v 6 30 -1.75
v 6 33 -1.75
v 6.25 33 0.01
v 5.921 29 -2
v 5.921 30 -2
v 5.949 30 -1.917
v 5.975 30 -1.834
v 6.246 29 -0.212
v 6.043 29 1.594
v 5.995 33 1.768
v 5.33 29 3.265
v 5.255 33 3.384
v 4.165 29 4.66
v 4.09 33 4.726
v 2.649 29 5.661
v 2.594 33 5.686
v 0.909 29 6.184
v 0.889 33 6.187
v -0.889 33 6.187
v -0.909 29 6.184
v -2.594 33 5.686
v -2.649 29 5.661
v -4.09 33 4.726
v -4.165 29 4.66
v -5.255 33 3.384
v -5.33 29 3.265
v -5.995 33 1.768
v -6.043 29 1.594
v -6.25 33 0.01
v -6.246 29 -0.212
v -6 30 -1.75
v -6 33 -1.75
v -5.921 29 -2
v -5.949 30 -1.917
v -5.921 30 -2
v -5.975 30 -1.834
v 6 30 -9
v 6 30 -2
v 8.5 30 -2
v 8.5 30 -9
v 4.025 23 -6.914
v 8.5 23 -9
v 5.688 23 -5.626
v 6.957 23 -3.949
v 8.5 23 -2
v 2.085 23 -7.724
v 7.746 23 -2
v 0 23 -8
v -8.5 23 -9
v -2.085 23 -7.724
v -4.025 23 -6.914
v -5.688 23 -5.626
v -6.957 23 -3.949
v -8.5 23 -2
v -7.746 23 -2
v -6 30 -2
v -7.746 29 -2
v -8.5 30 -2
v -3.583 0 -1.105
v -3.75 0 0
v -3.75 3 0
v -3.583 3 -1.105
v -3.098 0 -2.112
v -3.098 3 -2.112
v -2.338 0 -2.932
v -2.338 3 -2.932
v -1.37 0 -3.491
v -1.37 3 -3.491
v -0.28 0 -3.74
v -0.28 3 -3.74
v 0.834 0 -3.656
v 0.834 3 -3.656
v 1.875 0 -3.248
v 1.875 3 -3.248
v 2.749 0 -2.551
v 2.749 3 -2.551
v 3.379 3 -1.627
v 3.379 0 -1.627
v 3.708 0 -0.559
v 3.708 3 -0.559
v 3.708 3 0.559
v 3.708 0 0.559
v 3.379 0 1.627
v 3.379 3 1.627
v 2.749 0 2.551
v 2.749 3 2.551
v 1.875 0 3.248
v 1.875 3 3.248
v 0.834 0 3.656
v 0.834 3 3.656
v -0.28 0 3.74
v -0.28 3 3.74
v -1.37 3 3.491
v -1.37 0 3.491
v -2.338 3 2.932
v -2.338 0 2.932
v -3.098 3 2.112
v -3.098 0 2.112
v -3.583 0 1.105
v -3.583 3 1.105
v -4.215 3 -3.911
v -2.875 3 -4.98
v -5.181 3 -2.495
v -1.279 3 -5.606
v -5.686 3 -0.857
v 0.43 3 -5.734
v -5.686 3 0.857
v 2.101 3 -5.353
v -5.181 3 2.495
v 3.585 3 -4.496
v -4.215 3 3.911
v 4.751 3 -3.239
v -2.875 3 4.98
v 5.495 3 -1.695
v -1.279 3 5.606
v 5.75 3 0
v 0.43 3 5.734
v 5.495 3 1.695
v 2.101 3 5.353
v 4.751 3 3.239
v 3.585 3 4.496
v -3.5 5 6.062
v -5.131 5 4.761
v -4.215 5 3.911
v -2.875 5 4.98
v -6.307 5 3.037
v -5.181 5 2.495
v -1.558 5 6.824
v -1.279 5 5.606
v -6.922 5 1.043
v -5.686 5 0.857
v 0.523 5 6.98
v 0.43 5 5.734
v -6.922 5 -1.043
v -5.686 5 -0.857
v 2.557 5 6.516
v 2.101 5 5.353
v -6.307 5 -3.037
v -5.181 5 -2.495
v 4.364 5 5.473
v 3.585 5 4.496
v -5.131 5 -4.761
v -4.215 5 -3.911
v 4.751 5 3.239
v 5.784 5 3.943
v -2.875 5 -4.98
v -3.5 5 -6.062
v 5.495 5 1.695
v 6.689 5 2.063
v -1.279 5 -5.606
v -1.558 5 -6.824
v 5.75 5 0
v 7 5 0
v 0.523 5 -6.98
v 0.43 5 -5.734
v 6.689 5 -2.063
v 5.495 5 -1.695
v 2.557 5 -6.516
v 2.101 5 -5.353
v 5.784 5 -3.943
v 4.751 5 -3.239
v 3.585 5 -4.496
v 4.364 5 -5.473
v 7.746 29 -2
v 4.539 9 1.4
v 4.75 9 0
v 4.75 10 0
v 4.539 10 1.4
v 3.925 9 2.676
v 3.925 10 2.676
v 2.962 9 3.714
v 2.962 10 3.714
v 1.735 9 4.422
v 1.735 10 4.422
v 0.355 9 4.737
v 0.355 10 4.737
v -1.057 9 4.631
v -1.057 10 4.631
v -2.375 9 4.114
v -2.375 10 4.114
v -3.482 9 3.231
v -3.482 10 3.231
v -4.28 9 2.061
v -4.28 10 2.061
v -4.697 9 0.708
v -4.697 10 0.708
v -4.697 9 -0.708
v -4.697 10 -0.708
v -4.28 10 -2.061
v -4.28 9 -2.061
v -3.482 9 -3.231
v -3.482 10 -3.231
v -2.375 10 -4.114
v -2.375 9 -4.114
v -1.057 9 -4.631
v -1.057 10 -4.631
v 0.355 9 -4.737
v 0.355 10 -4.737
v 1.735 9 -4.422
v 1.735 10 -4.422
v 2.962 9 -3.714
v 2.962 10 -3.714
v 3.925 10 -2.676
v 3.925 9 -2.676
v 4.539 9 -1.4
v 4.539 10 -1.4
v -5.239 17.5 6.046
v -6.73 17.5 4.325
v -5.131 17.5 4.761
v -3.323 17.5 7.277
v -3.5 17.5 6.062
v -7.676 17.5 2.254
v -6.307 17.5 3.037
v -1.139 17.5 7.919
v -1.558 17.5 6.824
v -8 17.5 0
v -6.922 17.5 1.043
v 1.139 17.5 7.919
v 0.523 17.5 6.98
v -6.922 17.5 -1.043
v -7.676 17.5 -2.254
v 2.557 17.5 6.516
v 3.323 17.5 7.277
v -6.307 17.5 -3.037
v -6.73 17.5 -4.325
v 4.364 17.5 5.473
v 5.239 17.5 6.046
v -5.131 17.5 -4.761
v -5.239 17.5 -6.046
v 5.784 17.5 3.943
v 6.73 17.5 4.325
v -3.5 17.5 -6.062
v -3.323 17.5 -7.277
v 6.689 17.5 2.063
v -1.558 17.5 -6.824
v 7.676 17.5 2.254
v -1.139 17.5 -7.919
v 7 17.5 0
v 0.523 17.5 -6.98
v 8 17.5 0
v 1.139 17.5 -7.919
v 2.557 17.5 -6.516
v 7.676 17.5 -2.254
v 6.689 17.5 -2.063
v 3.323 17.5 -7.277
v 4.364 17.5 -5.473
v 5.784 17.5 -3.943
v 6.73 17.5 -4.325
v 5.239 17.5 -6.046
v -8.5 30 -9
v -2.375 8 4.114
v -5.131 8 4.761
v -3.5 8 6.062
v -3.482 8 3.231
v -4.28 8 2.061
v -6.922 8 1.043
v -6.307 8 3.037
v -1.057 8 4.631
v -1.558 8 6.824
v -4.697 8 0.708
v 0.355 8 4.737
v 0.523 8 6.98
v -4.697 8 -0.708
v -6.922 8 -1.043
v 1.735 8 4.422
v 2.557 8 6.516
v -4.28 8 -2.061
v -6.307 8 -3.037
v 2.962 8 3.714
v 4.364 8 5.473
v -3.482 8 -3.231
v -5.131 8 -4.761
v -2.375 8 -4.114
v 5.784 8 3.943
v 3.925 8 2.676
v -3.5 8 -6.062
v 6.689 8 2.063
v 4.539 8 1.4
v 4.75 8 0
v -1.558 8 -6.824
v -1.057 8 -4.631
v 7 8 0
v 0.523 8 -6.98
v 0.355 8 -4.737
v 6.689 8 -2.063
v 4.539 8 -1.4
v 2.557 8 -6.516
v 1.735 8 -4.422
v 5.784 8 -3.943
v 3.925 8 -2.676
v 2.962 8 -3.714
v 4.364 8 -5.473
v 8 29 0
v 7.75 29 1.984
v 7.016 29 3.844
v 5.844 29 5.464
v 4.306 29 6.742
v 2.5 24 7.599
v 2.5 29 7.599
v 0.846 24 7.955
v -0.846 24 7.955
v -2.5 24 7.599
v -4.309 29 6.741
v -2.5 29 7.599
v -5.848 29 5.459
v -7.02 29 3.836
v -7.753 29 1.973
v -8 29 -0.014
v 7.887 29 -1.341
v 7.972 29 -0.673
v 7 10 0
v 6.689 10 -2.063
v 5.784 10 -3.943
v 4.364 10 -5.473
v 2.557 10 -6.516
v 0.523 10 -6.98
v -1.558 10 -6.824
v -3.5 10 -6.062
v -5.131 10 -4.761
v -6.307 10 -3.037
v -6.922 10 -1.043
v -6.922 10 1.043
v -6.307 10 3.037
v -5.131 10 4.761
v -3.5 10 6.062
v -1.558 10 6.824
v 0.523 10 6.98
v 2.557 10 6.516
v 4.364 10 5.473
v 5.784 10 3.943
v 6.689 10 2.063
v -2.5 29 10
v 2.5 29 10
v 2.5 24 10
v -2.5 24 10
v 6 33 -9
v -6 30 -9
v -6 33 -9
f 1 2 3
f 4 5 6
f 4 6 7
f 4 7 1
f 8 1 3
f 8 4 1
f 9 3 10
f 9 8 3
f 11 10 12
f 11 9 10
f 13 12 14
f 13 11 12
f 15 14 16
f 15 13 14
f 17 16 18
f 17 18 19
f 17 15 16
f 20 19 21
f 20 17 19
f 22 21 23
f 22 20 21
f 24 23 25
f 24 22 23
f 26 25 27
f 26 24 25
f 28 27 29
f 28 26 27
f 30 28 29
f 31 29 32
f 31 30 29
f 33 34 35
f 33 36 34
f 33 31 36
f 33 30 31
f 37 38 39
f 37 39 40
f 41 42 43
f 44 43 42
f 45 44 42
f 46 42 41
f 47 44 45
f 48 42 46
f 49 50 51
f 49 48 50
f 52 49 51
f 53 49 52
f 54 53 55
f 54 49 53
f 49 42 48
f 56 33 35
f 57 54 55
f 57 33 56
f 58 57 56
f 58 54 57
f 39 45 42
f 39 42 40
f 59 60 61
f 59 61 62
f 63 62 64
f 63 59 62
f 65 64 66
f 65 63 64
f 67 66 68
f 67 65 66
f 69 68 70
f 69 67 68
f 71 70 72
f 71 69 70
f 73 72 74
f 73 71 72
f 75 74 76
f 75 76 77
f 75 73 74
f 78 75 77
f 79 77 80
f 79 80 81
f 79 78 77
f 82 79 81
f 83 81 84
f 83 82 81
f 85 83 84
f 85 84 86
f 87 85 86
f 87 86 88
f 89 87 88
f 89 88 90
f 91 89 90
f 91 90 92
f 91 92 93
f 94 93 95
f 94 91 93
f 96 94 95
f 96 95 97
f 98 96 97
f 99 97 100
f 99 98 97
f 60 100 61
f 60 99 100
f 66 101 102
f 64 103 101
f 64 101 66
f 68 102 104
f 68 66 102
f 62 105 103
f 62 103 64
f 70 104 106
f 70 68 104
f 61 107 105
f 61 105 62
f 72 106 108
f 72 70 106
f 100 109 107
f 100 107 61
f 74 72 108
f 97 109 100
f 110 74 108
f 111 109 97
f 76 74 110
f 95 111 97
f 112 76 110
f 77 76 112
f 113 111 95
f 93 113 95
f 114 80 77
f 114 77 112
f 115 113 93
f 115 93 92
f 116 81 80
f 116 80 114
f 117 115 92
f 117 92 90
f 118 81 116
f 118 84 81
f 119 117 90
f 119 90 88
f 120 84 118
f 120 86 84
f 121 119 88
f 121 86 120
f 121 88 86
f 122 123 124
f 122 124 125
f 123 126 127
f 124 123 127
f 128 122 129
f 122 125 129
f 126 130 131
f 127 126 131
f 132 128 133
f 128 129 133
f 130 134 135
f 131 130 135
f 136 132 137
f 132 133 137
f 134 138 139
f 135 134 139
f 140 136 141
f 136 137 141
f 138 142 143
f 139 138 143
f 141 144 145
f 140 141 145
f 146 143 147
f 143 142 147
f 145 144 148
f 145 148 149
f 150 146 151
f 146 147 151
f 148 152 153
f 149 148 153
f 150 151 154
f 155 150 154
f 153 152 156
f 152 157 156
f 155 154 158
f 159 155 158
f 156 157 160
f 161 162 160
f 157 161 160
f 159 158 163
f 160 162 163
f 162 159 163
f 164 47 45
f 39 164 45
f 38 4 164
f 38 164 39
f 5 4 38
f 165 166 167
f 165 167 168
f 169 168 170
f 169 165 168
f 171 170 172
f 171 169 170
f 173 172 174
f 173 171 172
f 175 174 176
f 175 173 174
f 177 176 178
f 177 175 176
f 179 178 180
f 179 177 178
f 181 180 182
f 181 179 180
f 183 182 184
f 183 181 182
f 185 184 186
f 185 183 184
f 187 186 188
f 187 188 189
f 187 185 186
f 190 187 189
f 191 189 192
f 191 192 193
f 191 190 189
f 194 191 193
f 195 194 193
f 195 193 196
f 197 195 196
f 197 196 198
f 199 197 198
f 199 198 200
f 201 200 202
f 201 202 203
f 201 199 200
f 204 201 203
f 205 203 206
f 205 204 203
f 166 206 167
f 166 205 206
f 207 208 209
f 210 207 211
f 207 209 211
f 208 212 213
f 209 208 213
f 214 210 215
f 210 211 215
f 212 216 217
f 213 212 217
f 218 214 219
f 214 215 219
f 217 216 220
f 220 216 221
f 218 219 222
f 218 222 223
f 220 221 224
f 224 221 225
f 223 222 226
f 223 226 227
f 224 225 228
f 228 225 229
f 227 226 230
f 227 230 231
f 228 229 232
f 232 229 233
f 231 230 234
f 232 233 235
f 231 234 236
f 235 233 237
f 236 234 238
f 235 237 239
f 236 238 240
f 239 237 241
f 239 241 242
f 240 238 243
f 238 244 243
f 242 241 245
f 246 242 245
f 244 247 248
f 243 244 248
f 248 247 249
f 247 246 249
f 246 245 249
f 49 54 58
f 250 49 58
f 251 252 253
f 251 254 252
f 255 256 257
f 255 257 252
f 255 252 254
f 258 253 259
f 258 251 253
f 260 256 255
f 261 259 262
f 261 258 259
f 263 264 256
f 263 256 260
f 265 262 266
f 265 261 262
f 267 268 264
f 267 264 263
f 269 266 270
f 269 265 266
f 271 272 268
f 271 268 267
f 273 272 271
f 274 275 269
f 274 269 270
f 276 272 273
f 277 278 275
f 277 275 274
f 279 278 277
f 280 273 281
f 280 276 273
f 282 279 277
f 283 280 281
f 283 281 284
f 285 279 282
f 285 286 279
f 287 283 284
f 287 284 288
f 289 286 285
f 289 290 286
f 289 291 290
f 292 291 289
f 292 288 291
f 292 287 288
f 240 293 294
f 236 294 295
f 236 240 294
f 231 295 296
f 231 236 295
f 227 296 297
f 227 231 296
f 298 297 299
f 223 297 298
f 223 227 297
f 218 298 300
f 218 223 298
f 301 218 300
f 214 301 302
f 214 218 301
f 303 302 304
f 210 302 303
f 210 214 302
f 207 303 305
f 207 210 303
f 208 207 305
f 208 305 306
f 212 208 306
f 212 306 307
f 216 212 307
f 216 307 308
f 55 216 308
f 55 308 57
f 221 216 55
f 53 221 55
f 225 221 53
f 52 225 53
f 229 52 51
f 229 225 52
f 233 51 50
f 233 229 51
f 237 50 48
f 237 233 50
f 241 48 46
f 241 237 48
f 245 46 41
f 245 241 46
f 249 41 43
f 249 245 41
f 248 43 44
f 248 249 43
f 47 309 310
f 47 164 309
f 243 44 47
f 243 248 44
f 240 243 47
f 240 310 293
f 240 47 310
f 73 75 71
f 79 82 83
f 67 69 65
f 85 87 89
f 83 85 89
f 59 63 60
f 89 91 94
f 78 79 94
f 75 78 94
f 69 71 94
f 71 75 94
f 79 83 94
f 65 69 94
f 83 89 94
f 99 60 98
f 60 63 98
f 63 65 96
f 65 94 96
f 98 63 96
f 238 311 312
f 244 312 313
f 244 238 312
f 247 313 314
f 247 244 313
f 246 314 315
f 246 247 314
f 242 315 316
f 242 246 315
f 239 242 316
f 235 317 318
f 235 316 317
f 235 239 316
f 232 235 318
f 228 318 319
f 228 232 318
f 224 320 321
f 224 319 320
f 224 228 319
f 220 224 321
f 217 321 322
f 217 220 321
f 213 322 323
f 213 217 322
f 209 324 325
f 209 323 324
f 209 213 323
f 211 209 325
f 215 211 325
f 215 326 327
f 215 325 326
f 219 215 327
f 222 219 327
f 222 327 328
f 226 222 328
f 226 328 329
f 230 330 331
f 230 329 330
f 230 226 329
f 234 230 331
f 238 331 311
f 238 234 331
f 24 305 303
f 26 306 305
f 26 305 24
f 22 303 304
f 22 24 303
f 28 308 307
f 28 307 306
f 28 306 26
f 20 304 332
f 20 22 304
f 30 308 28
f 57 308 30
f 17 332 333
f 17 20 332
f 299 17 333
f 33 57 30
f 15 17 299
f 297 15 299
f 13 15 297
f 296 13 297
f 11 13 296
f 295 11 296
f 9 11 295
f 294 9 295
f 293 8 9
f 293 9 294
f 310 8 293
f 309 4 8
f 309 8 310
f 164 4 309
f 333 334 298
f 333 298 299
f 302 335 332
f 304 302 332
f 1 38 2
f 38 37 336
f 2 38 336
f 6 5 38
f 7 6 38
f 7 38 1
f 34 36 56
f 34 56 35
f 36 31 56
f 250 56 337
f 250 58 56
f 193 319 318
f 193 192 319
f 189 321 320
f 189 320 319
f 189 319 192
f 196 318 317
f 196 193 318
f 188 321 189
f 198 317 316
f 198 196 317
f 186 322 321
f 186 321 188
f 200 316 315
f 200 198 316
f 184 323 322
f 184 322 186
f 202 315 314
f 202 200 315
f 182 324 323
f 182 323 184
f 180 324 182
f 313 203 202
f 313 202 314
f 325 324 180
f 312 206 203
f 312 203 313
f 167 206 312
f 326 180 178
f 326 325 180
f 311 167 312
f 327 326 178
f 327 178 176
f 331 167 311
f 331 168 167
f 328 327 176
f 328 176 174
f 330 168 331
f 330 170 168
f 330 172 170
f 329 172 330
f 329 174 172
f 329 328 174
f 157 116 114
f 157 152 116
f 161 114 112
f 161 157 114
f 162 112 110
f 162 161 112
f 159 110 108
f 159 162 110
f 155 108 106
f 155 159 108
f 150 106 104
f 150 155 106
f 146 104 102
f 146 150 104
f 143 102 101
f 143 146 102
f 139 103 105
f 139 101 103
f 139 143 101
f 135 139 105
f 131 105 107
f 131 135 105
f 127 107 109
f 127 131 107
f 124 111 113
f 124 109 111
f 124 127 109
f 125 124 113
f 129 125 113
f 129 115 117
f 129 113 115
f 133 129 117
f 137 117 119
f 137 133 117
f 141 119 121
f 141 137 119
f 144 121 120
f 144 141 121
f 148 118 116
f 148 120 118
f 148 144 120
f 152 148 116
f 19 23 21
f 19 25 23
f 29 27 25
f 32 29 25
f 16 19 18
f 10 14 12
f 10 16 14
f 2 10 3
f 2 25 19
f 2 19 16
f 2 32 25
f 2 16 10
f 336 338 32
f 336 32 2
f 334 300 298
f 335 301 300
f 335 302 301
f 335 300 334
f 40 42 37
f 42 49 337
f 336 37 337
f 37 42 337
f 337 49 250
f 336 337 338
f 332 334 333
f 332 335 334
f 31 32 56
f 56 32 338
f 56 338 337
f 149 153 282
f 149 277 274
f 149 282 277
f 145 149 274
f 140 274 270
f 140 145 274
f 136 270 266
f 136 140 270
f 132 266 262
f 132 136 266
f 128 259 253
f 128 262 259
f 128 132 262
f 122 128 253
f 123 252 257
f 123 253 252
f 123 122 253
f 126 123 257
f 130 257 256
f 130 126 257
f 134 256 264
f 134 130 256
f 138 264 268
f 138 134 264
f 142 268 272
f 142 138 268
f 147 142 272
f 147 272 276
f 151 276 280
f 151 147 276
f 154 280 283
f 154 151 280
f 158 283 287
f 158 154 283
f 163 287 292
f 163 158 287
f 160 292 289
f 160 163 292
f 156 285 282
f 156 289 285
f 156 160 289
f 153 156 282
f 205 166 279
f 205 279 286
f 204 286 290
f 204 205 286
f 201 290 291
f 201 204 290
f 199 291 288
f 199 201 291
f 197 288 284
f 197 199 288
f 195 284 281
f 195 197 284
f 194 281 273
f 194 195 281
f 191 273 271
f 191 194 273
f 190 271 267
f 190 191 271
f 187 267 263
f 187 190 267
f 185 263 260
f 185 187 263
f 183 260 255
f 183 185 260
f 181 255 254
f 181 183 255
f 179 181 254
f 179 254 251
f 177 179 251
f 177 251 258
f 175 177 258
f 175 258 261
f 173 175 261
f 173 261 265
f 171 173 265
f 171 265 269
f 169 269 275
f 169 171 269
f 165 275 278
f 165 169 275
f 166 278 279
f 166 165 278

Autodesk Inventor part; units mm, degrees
ref_plane "YZ Plane" through (0, 0, 0) normal (1, 0, 0) x (0, 1, 0)
ref_plane "XZ Plane" through (0, 0, 0) normal (0, 1, 0) x (-1, 0, 0)
ref_plane "XY Plane" through (0, 0, 0) normal (0, 0, 1) x (1, 0, 0)
sketch "Sketch1" plane through (0, 0, 0) normal (0, 1, 0) x (-1, 0, 0)
  circle A0 centre (0, 0) radius 3.75
  dimension "d0" = 7.5
extrude "Extrusion1" add sketch "Sketch1" along normal blind 5
sketch "Sketch2" plane through (0, 5, 0) normal (0, 1, 0) x (1, 0, 0)
  circle A0 centre (0, 0) radius 7
  dimension "d3" = 14
extrude "Extrusion2" add sketch "Sketch2" along normal blind 4
sketch "Sketch3" plane through (0, 9, 0) normal (0, 1, 0) x (1, 0, 0)
  circle A0 centre (0, 0) radius 4.75
  dimension "d6" = 9.5
extrude "Extrusion3" add sketch "Sketch3" along normal blind 4
sketch "Sketch4" plane through (0, 0, 0) normal (1, 0, 0) x (0, 1, 0)
  line L0 (5, -7) -> (5, 7) projected
  line L1 (9, -7) -> (9, 7) projected
  line L2 (13, -4.75) -> (13, 4.75) projected
  line L3 (0, -3.75) -> (0, 3.75) projected
  point P0 (0, 0)
  dimension "d9" = 4
  dimension "d10" = 4
  dimension "d11" = 5
sketch "Sketch5" plane through (0, 13, 0) normal (0, 1, 0) x (1, 0, 0)
  circle A0 centre (0, 0) radius 7
  dimension "d12" = 14
extrude "Extrusion4" add sketch "Sketch5" along normal blind 4.5
sketch "Sketch6" plane through (0, 17.5, 0) normal (0, 1, 0) x (1, 0, 0)
  circle A0 centre (0, 0) radius 8
  dimension "d15" = 16
extrude "Extrusion5" add sketch "Sketch6" along normal blind 11.5
sketch "Sketch7" plane through (0, 29, 0) normal (0, 1, 0) x (1, 0, 0)
  circle A0 centre (0, 0) radius 6.25
  dimension "d18" = 12.5
extrude "Extrusion6" add sketch "Sketch7" along normal blind 25
sketch "Sketch8" plane through (0, 0, 0) normal (1, 0, 0) x (0, 1, 0)
  line L0 (54, -6.25) -> (54, 6.25) projected
  line L1 (0, -3.75) -> (0, 3.75) projected
  line L2 (29, -8) -> (29, 8) projected
  line L3 (17.5, -8) -> (17.5, 8) projected
  point P0 (0, 0)
  point P1 (0, 0)
  dimension "d21" = 54
  dimension "d22" = 29
  dimension "d23" = 17.5
sketch "Sketch9" plane through (0, 54, 0) normal (0, 1, 0) x (1, 0, 0)
  circle A0 centre (0, 0) radius 7
  dimension "d24" = 14
extrude "Extrusion7" add sketch "Sketch9" along normal blind 10
sketch "Sketch10" plane through (0, 0, 0) normal (1, 0, 0) x (0, 1, 0)
  line L0 (64, -7) -> (64, 7) projected
  line L1 (0, -3.75) -> (0, 3.75) projected
  point P0 (0, 0)
  dimension "d27" = 64
sketch "Sketch11" plane through (0, 64, 0) normal (0, 1, 0) x (1, 0, 0)
  circle A0 centre (0, 0) radius 7
  dimension "d28" = 14
extrude "Extrusion8" add sketch "Sketch11" along normal blind 9
sketch "Sketch12" plane through (0, 73, 0) normal (0, 1, 0) x (1, 0, 0)
  circle A0 centre (0, 0) radius 4.5
  dimension "d31" = 9
extrude "Extrusion9" add sketch "Sketch12" along normal blind 1
sketch "Sketch13" plane through (0, 0, 0) normal (1, 0, 0) x (0, 1, 0)
  point P0 (0, 0)
sketch "Sketch14" plane through (0, 0, 0) normal (1, 0, 0) x (0, 1, 0)
  line L0 (73, -7) -> (73, 7) projected
  line L1 (0, -3.75) -> (0, 3.75) projected
  line L2 (74, -4.5) -> (74, 4.5) projected
  point P0 (0, 0)
  point P1 (0, 0)
  dimension "d34" = 73
  dimension "d35" = 74
sketch "Sketch15" plane through (0, 74, 0) normal (0, 1, 0) x (1, 0, 0)
  circle A0 centre (0, 0) radius 7
  dimension "d36" = 14
extrude "Extrusion10" add sketch "Sketch15" along normal blind 11.5
sketch "Sketch16" plane through (0, 0, 0) normal (1, 0, 0) x (0, 1, 0)
  line L0 (85.5, -7) -> (85.5, 7) projected
  line L1 (0, -3.75) -> (0, 3.75) projected
  point P0 (0, 0)
  dimension "d39" = 85.5
sketch "Sketch17" plane through (0, 0, 0) normal (1, 0, 0) x (0, 1, 0)
  line L0 (23, -9) -> (30, -9)
  line L1 (0, -3.75) -> (0, 3.75) projected
  line L2 (23, -9) -> (23, -2)
  line L3 (54, 7) -> (73, 7) projected
  line L4 (23, -2) -> (30, -2)
  line L5 (30, -2) -> (30, -9)
  point P0 (0, 0)
  point P1 (0, 0)
  point P2 (26.5, -9)
  dimension "d40" = 7
  dimension "d41" = 23
  dimension "d42" = 7
  dimension "d43" = 9
extrude "Extrusion11" add sketch "Sketch17" along normal mid plane 17
sketch "Sketch18" plane through (0, 0, 0) normal (1, 0, 0) x (0, 1, 0)
  line L0 (24, 10) -> (29, 10)
  line L1 (29, 10) -> (29, 6)
  line L2 (29, 6) -> (24, 6)
  line L3 (17.5, 8) -> (29, 8) projected
  line L4 (24, 6) -> (24, 10)
  line L5 (0, -3.75) -> (0, 3.75) projected
  point P0 (0, 0)
  point P1 (24, 8)
  point P2 (0, 0)
  point P3 (26.5, 10)
  dimension "d46" = 5
  dimension "d47" = 4
  dimension "d48" = 24
  dimension "d49" = 10
extrude "Extrusion12" add sketch "Sketch18" along normal mid plane 5
sketch "Sketch19" plane through (8.5, 0, 0) normal (1, 0, 0) x (0, 0, -1)
  line L0 (3.75, 0) -> (-3.75, 0) projected
  point P0 (0, 0)
  point P1 (9, 23)
  dimension "d52" = 23
sketch "Sketch20" plane through (8.5, 30, -9) normal (0, 0, -1) x (-1, 0, 0)
  line L0 (14.4214, 0) -> (2.5786, 0) projected
  line L1 (8.5, 0) -> (2.5, 0)
  line L2 (2.5, 0) -> (2.5, 29)
  line L3 (1.5, 24) -> (1.5, 43) projected
  line L4 (2.5, 29) -> (14.5, 29)
  line L5 (14.5, 29) -> (14.5, 0)
  line L6 (14.5, 0) -> (2.5, 0)
  point P0 (8.5, -30)
  point P1 (2.5786, 0)
  dimension "d53" = 6
  dimension "d54" = 29
  dimension "d55" = 90
  dimension "d56" = 12
  dimension "d57" = 29
  dimension "d58" = 90
extrude "Extrusion13" add sketch "Sketch20" against normal blind 9
sketch "Sketch21" plane through (8.5, 23, -9) normal (0, 0, -1) x (-1, 0, 0)
  point P0 (8.5, -23)
sketch "Sketch22" plane through (0, 13, 0) normal (0, -1, 0) x (1, 0, 0)
  circle A0 centre (0, 0) radius 7
extrude "Extrusion14" add sketch "Sketch22" along normal blind 3
sketch "Sketch23" plane through (0, 9, 0) normal (0, 1, 0) x (1, 0, 0)
  circle A0 centre (0, 0) radius 3.75 projected
  circle A1 centre (0, 0) radius 7
  circle A2 centre (0, 0) radius 7
  circle A3 centre (0, 0) radius 4.75
  dimension "d63" = 14
  dimension "d64" = 9.5
extrude "Extrusion15" cut sketch "Sketch23" against normal blind 1 contours A1
sketch "Sketch24" plane through (0, 5, 0) normal (0, -1, 0) x (1, 0, 0)
  circle A0 centre (0, 0) radius 5.75
  dimension "d67" = 11.5
extrude "Extrusion16" add sketch "Sketch24" along normal blind 2
sketch "Sketch25" plane through (0, 85.5, 0) normal (0, 1, 0) x (1, 0, 0)
  circle A0 centre (0, 0) radius 7
extrude "Extrusion17" cut sketch "Sketch25" against normal blind 6.5
sketch "Sketch26" plane through (0, 0, 0) normal (1, 0, 0) x (0, 1, 0)
  line L0 (79, 7) -> (79, -7) projected
  line L1 (0, -3.75) -> (0, 3.75) projected
  point P0 (0, 0)
  dimension "d72" = 79
sketch "Sketch27" plane through (0, 79, 0) normal (0, 1, 0) x (1, 0, 0)
  point P0 (0, 0)
sketch "Sketch28" plane through (0, 79, 0) normal (0, 1, 0) x (1, 0, 0)
  circle A0 centre (0, 0) radius 17.2984
extrude "Extrusion18" cut sketch "Sketch28" against normal blind 13
extrude "Extrusion19" cut sketch "Sketch28" against normal blind 46
equation "\"BendRadius\" = Thickness"
equation "\"BendReliefWidth\" = Thickness"
equation "\"BendReliefDepth\" = 0.5 * Thickness"
equation "\"CornerReliefSize\" = 4 * Thickness"
equation "\"MinimumRemnant\" = 2 * Thickness"
equation "\"TransitionRadius\" = BendRadius"
equation "\"JacobiRadiusSize\" = BendRadius"
equation "\"GapSize\" = Thickness"
equation "\"Thickness\" = 3.048"
properties part number "injector carcasa - 3"
